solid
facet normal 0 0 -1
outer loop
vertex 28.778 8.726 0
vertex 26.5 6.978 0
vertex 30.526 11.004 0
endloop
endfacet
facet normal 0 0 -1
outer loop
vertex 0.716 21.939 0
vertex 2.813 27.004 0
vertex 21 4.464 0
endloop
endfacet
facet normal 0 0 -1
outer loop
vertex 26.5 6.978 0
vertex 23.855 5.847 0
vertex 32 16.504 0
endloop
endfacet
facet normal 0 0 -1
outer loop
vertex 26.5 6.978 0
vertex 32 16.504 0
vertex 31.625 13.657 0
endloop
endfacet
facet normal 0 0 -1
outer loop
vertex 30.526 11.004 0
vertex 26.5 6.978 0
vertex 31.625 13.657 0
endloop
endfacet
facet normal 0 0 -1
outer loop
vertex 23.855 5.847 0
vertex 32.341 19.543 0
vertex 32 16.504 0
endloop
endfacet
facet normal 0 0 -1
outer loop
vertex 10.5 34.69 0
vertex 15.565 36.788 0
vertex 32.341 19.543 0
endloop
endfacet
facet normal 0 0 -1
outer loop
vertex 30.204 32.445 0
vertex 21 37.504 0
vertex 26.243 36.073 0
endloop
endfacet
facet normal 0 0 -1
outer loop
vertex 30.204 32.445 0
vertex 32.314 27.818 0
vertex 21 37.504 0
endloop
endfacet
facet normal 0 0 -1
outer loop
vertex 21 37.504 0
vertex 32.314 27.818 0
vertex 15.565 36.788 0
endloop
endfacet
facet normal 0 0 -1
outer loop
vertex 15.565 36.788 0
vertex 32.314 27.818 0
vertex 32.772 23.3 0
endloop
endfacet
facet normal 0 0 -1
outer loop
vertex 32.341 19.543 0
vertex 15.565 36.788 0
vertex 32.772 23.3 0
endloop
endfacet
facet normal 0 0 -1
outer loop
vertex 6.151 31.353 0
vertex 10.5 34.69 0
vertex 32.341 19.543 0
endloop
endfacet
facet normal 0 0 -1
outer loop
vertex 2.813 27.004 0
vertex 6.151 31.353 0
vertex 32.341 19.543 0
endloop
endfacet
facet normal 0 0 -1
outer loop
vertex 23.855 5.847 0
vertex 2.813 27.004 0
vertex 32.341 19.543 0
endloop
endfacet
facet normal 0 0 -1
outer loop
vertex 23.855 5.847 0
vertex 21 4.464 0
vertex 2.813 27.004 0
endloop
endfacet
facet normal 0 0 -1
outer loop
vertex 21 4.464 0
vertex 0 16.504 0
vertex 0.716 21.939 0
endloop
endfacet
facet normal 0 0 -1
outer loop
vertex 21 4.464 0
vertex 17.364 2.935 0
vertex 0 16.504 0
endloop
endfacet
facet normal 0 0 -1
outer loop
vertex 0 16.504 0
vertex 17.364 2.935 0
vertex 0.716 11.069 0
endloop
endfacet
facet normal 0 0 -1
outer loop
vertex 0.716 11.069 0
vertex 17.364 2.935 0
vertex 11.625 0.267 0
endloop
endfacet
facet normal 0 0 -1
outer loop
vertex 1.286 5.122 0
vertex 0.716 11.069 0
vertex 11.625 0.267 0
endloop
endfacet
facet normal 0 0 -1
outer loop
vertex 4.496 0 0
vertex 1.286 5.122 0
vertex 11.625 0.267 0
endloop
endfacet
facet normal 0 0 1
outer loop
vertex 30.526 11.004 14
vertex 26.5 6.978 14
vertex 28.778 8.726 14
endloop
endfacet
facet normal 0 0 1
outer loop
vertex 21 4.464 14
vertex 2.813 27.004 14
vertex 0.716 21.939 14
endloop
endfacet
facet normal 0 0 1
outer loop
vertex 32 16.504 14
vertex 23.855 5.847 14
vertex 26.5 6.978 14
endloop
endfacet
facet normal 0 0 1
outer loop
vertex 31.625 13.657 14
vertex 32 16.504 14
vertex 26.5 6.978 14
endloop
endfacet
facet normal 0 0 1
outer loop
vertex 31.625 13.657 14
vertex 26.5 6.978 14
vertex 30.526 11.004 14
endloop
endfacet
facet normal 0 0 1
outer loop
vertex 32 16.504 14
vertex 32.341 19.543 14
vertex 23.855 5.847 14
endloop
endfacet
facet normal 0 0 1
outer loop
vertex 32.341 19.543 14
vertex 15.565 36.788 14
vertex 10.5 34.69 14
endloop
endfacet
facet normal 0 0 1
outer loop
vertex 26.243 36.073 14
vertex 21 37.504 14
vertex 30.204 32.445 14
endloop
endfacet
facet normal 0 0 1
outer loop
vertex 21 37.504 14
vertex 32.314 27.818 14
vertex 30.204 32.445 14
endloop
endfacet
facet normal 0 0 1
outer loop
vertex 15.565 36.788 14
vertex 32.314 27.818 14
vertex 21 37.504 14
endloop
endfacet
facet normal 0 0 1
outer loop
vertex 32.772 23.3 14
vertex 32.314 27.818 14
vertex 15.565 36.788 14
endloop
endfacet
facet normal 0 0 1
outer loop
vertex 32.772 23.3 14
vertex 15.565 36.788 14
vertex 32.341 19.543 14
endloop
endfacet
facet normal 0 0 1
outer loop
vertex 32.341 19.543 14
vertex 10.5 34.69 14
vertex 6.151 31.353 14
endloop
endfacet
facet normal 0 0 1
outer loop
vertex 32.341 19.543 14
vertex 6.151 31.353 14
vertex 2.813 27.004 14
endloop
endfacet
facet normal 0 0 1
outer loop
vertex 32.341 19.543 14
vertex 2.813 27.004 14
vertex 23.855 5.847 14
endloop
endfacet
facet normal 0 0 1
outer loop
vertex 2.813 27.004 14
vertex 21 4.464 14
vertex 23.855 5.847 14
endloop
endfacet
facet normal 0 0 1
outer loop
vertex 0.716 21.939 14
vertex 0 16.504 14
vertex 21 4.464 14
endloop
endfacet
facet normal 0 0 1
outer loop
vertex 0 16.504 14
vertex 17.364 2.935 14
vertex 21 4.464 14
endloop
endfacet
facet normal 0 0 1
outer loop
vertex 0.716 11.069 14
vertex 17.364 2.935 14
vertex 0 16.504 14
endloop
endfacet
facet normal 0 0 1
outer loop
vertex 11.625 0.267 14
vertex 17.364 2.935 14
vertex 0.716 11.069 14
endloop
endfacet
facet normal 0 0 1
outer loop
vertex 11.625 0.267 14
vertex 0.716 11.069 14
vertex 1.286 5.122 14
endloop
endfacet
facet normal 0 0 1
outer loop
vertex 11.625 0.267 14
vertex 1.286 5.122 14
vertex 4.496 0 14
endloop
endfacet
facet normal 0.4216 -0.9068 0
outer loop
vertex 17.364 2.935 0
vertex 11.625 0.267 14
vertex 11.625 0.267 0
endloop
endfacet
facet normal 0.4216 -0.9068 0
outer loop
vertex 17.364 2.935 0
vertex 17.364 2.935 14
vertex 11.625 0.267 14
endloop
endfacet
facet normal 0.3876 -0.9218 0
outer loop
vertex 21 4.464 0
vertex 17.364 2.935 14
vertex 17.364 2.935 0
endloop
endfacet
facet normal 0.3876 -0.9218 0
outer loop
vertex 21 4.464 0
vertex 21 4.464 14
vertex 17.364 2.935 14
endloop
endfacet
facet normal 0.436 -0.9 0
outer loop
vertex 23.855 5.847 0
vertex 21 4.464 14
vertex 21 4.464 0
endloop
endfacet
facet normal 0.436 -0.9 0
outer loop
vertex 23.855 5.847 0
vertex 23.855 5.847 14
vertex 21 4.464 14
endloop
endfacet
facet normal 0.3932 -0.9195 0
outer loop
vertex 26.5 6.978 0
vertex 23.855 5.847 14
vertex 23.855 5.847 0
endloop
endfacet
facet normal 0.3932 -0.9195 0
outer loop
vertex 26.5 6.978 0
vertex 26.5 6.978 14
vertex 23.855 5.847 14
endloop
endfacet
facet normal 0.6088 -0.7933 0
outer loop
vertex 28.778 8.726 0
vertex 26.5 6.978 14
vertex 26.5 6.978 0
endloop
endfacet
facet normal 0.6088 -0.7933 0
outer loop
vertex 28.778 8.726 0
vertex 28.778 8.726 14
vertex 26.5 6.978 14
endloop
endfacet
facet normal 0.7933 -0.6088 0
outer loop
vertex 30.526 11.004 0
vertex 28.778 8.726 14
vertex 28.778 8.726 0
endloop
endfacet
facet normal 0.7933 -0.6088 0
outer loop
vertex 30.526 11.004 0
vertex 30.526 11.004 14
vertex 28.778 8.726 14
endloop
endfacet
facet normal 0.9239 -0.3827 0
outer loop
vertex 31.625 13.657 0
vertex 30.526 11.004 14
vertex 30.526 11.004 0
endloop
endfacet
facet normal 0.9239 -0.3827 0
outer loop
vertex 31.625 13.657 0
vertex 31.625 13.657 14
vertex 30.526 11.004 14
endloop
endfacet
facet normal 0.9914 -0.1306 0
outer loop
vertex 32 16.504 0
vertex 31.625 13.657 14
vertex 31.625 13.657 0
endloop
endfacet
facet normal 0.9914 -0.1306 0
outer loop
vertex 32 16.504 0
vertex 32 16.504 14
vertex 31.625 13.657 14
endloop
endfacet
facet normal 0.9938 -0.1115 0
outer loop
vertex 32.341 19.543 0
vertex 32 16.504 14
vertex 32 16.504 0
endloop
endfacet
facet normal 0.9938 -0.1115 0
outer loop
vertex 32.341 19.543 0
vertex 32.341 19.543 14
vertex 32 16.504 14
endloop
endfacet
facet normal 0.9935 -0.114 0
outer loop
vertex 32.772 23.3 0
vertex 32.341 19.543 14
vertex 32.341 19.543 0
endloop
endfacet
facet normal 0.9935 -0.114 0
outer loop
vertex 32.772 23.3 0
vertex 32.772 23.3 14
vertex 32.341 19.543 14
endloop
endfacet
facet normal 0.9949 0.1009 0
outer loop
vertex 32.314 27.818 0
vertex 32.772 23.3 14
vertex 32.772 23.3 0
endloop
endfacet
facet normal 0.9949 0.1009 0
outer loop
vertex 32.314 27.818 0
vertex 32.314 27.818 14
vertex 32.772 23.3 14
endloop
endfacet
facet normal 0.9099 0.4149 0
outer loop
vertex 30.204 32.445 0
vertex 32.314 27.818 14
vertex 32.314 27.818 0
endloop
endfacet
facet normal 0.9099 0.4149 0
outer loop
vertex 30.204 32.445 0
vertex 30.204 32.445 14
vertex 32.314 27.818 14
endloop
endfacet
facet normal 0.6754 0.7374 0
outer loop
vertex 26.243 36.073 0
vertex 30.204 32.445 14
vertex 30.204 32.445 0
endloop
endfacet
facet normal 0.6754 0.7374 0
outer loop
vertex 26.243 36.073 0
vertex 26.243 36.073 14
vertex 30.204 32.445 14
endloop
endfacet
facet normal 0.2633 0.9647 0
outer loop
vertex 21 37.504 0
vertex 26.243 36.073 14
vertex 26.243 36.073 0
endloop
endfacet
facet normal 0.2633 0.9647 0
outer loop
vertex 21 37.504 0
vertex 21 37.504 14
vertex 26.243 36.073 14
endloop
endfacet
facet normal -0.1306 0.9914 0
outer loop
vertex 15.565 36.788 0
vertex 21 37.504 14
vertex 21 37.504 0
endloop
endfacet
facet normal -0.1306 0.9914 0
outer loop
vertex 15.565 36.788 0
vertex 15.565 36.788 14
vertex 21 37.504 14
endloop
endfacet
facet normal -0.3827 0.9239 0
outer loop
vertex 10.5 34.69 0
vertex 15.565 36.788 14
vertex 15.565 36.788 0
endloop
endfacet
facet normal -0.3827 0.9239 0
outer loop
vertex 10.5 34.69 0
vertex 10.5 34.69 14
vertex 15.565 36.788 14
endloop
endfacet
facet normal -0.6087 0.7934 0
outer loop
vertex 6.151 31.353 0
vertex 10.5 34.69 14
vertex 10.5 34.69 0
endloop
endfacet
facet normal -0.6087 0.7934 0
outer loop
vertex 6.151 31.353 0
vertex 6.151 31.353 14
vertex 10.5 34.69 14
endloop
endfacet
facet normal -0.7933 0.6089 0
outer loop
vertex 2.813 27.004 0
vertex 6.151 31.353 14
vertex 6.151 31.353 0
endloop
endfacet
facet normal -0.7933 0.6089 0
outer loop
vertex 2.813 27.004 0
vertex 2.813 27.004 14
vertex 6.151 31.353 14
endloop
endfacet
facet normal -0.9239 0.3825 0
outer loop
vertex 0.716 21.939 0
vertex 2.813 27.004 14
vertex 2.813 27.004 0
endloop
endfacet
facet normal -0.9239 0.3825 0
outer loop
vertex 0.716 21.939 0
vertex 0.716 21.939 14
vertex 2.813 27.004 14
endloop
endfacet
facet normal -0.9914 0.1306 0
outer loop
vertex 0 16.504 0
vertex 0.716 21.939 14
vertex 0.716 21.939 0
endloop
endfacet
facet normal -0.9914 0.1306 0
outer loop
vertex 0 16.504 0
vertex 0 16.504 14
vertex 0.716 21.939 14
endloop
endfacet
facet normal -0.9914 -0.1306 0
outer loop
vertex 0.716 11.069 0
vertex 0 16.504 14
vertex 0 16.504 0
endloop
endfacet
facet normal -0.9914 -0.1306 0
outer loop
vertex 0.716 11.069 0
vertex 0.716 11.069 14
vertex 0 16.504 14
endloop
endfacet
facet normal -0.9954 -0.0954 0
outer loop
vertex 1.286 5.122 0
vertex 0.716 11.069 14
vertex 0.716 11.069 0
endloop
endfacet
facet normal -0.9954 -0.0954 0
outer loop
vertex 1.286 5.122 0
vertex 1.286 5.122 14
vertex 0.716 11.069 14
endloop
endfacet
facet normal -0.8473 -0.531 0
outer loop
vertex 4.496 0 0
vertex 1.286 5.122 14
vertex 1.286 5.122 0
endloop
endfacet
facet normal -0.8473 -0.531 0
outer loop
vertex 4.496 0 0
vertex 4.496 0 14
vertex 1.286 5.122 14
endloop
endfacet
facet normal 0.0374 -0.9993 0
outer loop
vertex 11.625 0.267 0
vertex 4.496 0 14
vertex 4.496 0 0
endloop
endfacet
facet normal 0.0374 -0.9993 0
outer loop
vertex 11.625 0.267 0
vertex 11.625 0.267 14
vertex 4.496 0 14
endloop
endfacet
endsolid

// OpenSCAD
$fn = 32;

// ----------------------------------------------------------------------
// Cam disc: base radius 11.0 mm, lift 10.0 mm, 24 profile points
// ----------------------------------------------------------------------

// --- parameters (mm) ---
profile_height = 14;      // extrusion height
profile_points = 24;      // points of the closed outline

profile = [[32, 16.504], [32.341, 19.543], [32.772, 23.3], [32.314, 27.818], [30.204, 32.445], [26.243, 36.073], [21, 37.504], [15.565, 36.788], [10.5, 34.69], [6.151, 31.353], [2.813, 27.004], [0.716, 21.939], [0, 16.504], [0.716, 11.069], [1.286, 5.122], [4.496, 0], [11.625, 0.267], [17.364, 2.935], [21, 4.464], [23.855, 5.847], [26.5, 6.978], [28.778, 8.726], [30.526, 11.004], [31.625, 13.657]];  // single closed polygon, 24 points, counter clockwise

// --- the one profile operation ---
linear_extrude(height = profile_height) polygon(points = profile);
